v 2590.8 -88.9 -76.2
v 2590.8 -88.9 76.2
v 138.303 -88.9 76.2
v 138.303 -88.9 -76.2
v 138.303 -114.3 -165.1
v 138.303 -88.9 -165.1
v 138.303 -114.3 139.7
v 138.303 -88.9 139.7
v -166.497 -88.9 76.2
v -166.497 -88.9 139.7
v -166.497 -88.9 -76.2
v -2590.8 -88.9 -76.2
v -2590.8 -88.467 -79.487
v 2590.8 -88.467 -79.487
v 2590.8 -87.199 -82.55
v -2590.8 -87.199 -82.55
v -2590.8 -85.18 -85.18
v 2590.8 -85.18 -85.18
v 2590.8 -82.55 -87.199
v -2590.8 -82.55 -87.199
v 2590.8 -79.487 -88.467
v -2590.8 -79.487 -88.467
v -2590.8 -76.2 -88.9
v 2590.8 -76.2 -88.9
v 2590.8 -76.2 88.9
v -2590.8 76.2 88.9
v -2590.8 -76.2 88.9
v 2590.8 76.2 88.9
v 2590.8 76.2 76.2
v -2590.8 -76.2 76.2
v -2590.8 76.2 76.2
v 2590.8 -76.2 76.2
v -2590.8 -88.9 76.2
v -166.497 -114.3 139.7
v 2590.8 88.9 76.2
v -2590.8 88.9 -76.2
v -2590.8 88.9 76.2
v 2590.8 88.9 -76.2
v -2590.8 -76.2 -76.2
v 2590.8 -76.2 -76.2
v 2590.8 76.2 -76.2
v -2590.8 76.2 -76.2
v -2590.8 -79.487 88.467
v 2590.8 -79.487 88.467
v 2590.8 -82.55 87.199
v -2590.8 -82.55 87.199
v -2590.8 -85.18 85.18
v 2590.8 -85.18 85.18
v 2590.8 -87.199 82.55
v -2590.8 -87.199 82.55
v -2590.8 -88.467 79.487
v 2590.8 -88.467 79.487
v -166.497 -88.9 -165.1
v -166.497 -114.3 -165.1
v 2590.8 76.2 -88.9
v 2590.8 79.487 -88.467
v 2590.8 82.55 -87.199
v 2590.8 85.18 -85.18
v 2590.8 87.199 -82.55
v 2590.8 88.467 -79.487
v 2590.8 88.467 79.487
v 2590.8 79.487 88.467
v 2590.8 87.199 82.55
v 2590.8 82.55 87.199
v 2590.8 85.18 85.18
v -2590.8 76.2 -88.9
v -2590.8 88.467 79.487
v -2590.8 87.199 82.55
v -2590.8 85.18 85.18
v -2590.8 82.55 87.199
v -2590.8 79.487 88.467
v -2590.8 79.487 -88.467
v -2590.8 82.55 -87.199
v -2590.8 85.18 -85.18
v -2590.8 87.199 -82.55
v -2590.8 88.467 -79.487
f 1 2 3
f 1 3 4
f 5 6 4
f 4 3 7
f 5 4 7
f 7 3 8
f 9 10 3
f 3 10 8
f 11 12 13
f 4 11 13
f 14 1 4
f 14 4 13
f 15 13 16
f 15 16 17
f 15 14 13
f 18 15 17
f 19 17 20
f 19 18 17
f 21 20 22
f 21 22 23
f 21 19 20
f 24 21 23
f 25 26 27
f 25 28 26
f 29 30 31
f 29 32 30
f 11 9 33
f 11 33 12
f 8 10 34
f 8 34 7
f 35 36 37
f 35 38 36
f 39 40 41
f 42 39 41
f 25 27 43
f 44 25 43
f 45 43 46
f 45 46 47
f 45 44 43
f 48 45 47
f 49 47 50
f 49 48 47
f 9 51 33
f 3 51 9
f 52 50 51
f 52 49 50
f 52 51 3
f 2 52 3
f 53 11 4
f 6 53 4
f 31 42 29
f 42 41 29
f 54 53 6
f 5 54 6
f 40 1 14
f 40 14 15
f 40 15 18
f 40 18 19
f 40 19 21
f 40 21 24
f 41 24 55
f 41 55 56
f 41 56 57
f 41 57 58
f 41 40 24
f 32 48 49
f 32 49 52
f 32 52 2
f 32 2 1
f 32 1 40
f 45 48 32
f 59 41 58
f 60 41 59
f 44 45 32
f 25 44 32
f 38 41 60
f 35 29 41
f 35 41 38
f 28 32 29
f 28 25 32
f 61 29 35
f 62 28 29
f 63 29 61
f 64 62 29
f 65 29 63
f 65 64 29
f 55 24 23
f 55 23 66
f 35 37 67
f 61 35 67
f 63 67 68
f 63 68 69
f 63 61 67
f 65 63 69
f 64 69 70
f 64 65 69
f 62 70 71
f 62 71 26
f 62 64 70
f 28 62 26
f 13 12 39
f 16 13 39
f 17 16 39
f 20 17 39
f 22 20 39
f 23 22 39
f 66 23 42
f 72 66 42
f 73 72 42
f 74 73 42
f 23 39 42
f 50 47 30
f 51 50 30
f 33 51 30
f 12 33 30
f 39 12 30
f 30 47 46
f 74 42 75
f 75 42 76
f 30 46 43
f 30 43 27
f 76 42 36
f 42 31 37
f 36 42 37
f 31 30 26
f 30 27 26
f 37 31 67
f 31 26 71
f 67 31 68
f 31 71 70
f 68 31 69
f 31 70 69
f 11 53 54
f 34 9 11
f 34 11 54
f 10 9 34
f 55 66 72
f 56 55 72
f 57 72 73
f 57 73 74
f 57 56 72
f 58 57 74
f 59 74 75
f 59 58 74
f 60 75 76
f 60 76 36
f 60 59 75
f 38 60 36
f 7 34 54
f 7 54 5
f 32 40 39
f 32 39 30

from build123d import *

# Parameters (mm, degrees)
F0_W     = 152.4
F0_H     = 152.4
F1_DEPTH = 2590.8
F2_W     = 304.8
F2_H     = 304.8
F3_DEPTH = 25.4


with BuildPart() as f1:
    # F0 (on Right) → F1 (new body, symmetric)
    with BuildSketch(Plane.YZ):
        with BuildLine():
            Line((76.2, 88.9), (-76.2, 88.9))
            ThreePointArc((-76.2, 88.9), (-85.180256, 85.180256), (-88.9, 76.2))
            Line((-88.9, 76.2), (-88.9, -76.2))
            ThreePointArc((-88.9, -76.2), (-85.180256, -85.180256), (-76.2, -88.9))
            Line((-76.2, -88.9), (76.2, -88.9))
            ThreePointArc((76.2, -88.9), (85.180256, -85.180256), (88.9, -76.2))
            Line((88.9, -76.2), (88.9, 76.2))
            ThreePointArc((88.9, 76.2), (85.180256, 85.180256), (76.2, 88.9))
        make_face()
        Rectangle(F0_W, F0_H, mode=Mode.SUBTRACT)
    extrude(amount=F1_DEPTH, both=True)

    # F2 (on face) → F3 (join)
    with BuildSketch(Plane.XZ.offset(88.9)):
        with Locations((-14.097348, -12.7)):
            Rectangle(F2_W, F2_H)
    extrude(amount=F3_DEPTH)


solid = f1.part
